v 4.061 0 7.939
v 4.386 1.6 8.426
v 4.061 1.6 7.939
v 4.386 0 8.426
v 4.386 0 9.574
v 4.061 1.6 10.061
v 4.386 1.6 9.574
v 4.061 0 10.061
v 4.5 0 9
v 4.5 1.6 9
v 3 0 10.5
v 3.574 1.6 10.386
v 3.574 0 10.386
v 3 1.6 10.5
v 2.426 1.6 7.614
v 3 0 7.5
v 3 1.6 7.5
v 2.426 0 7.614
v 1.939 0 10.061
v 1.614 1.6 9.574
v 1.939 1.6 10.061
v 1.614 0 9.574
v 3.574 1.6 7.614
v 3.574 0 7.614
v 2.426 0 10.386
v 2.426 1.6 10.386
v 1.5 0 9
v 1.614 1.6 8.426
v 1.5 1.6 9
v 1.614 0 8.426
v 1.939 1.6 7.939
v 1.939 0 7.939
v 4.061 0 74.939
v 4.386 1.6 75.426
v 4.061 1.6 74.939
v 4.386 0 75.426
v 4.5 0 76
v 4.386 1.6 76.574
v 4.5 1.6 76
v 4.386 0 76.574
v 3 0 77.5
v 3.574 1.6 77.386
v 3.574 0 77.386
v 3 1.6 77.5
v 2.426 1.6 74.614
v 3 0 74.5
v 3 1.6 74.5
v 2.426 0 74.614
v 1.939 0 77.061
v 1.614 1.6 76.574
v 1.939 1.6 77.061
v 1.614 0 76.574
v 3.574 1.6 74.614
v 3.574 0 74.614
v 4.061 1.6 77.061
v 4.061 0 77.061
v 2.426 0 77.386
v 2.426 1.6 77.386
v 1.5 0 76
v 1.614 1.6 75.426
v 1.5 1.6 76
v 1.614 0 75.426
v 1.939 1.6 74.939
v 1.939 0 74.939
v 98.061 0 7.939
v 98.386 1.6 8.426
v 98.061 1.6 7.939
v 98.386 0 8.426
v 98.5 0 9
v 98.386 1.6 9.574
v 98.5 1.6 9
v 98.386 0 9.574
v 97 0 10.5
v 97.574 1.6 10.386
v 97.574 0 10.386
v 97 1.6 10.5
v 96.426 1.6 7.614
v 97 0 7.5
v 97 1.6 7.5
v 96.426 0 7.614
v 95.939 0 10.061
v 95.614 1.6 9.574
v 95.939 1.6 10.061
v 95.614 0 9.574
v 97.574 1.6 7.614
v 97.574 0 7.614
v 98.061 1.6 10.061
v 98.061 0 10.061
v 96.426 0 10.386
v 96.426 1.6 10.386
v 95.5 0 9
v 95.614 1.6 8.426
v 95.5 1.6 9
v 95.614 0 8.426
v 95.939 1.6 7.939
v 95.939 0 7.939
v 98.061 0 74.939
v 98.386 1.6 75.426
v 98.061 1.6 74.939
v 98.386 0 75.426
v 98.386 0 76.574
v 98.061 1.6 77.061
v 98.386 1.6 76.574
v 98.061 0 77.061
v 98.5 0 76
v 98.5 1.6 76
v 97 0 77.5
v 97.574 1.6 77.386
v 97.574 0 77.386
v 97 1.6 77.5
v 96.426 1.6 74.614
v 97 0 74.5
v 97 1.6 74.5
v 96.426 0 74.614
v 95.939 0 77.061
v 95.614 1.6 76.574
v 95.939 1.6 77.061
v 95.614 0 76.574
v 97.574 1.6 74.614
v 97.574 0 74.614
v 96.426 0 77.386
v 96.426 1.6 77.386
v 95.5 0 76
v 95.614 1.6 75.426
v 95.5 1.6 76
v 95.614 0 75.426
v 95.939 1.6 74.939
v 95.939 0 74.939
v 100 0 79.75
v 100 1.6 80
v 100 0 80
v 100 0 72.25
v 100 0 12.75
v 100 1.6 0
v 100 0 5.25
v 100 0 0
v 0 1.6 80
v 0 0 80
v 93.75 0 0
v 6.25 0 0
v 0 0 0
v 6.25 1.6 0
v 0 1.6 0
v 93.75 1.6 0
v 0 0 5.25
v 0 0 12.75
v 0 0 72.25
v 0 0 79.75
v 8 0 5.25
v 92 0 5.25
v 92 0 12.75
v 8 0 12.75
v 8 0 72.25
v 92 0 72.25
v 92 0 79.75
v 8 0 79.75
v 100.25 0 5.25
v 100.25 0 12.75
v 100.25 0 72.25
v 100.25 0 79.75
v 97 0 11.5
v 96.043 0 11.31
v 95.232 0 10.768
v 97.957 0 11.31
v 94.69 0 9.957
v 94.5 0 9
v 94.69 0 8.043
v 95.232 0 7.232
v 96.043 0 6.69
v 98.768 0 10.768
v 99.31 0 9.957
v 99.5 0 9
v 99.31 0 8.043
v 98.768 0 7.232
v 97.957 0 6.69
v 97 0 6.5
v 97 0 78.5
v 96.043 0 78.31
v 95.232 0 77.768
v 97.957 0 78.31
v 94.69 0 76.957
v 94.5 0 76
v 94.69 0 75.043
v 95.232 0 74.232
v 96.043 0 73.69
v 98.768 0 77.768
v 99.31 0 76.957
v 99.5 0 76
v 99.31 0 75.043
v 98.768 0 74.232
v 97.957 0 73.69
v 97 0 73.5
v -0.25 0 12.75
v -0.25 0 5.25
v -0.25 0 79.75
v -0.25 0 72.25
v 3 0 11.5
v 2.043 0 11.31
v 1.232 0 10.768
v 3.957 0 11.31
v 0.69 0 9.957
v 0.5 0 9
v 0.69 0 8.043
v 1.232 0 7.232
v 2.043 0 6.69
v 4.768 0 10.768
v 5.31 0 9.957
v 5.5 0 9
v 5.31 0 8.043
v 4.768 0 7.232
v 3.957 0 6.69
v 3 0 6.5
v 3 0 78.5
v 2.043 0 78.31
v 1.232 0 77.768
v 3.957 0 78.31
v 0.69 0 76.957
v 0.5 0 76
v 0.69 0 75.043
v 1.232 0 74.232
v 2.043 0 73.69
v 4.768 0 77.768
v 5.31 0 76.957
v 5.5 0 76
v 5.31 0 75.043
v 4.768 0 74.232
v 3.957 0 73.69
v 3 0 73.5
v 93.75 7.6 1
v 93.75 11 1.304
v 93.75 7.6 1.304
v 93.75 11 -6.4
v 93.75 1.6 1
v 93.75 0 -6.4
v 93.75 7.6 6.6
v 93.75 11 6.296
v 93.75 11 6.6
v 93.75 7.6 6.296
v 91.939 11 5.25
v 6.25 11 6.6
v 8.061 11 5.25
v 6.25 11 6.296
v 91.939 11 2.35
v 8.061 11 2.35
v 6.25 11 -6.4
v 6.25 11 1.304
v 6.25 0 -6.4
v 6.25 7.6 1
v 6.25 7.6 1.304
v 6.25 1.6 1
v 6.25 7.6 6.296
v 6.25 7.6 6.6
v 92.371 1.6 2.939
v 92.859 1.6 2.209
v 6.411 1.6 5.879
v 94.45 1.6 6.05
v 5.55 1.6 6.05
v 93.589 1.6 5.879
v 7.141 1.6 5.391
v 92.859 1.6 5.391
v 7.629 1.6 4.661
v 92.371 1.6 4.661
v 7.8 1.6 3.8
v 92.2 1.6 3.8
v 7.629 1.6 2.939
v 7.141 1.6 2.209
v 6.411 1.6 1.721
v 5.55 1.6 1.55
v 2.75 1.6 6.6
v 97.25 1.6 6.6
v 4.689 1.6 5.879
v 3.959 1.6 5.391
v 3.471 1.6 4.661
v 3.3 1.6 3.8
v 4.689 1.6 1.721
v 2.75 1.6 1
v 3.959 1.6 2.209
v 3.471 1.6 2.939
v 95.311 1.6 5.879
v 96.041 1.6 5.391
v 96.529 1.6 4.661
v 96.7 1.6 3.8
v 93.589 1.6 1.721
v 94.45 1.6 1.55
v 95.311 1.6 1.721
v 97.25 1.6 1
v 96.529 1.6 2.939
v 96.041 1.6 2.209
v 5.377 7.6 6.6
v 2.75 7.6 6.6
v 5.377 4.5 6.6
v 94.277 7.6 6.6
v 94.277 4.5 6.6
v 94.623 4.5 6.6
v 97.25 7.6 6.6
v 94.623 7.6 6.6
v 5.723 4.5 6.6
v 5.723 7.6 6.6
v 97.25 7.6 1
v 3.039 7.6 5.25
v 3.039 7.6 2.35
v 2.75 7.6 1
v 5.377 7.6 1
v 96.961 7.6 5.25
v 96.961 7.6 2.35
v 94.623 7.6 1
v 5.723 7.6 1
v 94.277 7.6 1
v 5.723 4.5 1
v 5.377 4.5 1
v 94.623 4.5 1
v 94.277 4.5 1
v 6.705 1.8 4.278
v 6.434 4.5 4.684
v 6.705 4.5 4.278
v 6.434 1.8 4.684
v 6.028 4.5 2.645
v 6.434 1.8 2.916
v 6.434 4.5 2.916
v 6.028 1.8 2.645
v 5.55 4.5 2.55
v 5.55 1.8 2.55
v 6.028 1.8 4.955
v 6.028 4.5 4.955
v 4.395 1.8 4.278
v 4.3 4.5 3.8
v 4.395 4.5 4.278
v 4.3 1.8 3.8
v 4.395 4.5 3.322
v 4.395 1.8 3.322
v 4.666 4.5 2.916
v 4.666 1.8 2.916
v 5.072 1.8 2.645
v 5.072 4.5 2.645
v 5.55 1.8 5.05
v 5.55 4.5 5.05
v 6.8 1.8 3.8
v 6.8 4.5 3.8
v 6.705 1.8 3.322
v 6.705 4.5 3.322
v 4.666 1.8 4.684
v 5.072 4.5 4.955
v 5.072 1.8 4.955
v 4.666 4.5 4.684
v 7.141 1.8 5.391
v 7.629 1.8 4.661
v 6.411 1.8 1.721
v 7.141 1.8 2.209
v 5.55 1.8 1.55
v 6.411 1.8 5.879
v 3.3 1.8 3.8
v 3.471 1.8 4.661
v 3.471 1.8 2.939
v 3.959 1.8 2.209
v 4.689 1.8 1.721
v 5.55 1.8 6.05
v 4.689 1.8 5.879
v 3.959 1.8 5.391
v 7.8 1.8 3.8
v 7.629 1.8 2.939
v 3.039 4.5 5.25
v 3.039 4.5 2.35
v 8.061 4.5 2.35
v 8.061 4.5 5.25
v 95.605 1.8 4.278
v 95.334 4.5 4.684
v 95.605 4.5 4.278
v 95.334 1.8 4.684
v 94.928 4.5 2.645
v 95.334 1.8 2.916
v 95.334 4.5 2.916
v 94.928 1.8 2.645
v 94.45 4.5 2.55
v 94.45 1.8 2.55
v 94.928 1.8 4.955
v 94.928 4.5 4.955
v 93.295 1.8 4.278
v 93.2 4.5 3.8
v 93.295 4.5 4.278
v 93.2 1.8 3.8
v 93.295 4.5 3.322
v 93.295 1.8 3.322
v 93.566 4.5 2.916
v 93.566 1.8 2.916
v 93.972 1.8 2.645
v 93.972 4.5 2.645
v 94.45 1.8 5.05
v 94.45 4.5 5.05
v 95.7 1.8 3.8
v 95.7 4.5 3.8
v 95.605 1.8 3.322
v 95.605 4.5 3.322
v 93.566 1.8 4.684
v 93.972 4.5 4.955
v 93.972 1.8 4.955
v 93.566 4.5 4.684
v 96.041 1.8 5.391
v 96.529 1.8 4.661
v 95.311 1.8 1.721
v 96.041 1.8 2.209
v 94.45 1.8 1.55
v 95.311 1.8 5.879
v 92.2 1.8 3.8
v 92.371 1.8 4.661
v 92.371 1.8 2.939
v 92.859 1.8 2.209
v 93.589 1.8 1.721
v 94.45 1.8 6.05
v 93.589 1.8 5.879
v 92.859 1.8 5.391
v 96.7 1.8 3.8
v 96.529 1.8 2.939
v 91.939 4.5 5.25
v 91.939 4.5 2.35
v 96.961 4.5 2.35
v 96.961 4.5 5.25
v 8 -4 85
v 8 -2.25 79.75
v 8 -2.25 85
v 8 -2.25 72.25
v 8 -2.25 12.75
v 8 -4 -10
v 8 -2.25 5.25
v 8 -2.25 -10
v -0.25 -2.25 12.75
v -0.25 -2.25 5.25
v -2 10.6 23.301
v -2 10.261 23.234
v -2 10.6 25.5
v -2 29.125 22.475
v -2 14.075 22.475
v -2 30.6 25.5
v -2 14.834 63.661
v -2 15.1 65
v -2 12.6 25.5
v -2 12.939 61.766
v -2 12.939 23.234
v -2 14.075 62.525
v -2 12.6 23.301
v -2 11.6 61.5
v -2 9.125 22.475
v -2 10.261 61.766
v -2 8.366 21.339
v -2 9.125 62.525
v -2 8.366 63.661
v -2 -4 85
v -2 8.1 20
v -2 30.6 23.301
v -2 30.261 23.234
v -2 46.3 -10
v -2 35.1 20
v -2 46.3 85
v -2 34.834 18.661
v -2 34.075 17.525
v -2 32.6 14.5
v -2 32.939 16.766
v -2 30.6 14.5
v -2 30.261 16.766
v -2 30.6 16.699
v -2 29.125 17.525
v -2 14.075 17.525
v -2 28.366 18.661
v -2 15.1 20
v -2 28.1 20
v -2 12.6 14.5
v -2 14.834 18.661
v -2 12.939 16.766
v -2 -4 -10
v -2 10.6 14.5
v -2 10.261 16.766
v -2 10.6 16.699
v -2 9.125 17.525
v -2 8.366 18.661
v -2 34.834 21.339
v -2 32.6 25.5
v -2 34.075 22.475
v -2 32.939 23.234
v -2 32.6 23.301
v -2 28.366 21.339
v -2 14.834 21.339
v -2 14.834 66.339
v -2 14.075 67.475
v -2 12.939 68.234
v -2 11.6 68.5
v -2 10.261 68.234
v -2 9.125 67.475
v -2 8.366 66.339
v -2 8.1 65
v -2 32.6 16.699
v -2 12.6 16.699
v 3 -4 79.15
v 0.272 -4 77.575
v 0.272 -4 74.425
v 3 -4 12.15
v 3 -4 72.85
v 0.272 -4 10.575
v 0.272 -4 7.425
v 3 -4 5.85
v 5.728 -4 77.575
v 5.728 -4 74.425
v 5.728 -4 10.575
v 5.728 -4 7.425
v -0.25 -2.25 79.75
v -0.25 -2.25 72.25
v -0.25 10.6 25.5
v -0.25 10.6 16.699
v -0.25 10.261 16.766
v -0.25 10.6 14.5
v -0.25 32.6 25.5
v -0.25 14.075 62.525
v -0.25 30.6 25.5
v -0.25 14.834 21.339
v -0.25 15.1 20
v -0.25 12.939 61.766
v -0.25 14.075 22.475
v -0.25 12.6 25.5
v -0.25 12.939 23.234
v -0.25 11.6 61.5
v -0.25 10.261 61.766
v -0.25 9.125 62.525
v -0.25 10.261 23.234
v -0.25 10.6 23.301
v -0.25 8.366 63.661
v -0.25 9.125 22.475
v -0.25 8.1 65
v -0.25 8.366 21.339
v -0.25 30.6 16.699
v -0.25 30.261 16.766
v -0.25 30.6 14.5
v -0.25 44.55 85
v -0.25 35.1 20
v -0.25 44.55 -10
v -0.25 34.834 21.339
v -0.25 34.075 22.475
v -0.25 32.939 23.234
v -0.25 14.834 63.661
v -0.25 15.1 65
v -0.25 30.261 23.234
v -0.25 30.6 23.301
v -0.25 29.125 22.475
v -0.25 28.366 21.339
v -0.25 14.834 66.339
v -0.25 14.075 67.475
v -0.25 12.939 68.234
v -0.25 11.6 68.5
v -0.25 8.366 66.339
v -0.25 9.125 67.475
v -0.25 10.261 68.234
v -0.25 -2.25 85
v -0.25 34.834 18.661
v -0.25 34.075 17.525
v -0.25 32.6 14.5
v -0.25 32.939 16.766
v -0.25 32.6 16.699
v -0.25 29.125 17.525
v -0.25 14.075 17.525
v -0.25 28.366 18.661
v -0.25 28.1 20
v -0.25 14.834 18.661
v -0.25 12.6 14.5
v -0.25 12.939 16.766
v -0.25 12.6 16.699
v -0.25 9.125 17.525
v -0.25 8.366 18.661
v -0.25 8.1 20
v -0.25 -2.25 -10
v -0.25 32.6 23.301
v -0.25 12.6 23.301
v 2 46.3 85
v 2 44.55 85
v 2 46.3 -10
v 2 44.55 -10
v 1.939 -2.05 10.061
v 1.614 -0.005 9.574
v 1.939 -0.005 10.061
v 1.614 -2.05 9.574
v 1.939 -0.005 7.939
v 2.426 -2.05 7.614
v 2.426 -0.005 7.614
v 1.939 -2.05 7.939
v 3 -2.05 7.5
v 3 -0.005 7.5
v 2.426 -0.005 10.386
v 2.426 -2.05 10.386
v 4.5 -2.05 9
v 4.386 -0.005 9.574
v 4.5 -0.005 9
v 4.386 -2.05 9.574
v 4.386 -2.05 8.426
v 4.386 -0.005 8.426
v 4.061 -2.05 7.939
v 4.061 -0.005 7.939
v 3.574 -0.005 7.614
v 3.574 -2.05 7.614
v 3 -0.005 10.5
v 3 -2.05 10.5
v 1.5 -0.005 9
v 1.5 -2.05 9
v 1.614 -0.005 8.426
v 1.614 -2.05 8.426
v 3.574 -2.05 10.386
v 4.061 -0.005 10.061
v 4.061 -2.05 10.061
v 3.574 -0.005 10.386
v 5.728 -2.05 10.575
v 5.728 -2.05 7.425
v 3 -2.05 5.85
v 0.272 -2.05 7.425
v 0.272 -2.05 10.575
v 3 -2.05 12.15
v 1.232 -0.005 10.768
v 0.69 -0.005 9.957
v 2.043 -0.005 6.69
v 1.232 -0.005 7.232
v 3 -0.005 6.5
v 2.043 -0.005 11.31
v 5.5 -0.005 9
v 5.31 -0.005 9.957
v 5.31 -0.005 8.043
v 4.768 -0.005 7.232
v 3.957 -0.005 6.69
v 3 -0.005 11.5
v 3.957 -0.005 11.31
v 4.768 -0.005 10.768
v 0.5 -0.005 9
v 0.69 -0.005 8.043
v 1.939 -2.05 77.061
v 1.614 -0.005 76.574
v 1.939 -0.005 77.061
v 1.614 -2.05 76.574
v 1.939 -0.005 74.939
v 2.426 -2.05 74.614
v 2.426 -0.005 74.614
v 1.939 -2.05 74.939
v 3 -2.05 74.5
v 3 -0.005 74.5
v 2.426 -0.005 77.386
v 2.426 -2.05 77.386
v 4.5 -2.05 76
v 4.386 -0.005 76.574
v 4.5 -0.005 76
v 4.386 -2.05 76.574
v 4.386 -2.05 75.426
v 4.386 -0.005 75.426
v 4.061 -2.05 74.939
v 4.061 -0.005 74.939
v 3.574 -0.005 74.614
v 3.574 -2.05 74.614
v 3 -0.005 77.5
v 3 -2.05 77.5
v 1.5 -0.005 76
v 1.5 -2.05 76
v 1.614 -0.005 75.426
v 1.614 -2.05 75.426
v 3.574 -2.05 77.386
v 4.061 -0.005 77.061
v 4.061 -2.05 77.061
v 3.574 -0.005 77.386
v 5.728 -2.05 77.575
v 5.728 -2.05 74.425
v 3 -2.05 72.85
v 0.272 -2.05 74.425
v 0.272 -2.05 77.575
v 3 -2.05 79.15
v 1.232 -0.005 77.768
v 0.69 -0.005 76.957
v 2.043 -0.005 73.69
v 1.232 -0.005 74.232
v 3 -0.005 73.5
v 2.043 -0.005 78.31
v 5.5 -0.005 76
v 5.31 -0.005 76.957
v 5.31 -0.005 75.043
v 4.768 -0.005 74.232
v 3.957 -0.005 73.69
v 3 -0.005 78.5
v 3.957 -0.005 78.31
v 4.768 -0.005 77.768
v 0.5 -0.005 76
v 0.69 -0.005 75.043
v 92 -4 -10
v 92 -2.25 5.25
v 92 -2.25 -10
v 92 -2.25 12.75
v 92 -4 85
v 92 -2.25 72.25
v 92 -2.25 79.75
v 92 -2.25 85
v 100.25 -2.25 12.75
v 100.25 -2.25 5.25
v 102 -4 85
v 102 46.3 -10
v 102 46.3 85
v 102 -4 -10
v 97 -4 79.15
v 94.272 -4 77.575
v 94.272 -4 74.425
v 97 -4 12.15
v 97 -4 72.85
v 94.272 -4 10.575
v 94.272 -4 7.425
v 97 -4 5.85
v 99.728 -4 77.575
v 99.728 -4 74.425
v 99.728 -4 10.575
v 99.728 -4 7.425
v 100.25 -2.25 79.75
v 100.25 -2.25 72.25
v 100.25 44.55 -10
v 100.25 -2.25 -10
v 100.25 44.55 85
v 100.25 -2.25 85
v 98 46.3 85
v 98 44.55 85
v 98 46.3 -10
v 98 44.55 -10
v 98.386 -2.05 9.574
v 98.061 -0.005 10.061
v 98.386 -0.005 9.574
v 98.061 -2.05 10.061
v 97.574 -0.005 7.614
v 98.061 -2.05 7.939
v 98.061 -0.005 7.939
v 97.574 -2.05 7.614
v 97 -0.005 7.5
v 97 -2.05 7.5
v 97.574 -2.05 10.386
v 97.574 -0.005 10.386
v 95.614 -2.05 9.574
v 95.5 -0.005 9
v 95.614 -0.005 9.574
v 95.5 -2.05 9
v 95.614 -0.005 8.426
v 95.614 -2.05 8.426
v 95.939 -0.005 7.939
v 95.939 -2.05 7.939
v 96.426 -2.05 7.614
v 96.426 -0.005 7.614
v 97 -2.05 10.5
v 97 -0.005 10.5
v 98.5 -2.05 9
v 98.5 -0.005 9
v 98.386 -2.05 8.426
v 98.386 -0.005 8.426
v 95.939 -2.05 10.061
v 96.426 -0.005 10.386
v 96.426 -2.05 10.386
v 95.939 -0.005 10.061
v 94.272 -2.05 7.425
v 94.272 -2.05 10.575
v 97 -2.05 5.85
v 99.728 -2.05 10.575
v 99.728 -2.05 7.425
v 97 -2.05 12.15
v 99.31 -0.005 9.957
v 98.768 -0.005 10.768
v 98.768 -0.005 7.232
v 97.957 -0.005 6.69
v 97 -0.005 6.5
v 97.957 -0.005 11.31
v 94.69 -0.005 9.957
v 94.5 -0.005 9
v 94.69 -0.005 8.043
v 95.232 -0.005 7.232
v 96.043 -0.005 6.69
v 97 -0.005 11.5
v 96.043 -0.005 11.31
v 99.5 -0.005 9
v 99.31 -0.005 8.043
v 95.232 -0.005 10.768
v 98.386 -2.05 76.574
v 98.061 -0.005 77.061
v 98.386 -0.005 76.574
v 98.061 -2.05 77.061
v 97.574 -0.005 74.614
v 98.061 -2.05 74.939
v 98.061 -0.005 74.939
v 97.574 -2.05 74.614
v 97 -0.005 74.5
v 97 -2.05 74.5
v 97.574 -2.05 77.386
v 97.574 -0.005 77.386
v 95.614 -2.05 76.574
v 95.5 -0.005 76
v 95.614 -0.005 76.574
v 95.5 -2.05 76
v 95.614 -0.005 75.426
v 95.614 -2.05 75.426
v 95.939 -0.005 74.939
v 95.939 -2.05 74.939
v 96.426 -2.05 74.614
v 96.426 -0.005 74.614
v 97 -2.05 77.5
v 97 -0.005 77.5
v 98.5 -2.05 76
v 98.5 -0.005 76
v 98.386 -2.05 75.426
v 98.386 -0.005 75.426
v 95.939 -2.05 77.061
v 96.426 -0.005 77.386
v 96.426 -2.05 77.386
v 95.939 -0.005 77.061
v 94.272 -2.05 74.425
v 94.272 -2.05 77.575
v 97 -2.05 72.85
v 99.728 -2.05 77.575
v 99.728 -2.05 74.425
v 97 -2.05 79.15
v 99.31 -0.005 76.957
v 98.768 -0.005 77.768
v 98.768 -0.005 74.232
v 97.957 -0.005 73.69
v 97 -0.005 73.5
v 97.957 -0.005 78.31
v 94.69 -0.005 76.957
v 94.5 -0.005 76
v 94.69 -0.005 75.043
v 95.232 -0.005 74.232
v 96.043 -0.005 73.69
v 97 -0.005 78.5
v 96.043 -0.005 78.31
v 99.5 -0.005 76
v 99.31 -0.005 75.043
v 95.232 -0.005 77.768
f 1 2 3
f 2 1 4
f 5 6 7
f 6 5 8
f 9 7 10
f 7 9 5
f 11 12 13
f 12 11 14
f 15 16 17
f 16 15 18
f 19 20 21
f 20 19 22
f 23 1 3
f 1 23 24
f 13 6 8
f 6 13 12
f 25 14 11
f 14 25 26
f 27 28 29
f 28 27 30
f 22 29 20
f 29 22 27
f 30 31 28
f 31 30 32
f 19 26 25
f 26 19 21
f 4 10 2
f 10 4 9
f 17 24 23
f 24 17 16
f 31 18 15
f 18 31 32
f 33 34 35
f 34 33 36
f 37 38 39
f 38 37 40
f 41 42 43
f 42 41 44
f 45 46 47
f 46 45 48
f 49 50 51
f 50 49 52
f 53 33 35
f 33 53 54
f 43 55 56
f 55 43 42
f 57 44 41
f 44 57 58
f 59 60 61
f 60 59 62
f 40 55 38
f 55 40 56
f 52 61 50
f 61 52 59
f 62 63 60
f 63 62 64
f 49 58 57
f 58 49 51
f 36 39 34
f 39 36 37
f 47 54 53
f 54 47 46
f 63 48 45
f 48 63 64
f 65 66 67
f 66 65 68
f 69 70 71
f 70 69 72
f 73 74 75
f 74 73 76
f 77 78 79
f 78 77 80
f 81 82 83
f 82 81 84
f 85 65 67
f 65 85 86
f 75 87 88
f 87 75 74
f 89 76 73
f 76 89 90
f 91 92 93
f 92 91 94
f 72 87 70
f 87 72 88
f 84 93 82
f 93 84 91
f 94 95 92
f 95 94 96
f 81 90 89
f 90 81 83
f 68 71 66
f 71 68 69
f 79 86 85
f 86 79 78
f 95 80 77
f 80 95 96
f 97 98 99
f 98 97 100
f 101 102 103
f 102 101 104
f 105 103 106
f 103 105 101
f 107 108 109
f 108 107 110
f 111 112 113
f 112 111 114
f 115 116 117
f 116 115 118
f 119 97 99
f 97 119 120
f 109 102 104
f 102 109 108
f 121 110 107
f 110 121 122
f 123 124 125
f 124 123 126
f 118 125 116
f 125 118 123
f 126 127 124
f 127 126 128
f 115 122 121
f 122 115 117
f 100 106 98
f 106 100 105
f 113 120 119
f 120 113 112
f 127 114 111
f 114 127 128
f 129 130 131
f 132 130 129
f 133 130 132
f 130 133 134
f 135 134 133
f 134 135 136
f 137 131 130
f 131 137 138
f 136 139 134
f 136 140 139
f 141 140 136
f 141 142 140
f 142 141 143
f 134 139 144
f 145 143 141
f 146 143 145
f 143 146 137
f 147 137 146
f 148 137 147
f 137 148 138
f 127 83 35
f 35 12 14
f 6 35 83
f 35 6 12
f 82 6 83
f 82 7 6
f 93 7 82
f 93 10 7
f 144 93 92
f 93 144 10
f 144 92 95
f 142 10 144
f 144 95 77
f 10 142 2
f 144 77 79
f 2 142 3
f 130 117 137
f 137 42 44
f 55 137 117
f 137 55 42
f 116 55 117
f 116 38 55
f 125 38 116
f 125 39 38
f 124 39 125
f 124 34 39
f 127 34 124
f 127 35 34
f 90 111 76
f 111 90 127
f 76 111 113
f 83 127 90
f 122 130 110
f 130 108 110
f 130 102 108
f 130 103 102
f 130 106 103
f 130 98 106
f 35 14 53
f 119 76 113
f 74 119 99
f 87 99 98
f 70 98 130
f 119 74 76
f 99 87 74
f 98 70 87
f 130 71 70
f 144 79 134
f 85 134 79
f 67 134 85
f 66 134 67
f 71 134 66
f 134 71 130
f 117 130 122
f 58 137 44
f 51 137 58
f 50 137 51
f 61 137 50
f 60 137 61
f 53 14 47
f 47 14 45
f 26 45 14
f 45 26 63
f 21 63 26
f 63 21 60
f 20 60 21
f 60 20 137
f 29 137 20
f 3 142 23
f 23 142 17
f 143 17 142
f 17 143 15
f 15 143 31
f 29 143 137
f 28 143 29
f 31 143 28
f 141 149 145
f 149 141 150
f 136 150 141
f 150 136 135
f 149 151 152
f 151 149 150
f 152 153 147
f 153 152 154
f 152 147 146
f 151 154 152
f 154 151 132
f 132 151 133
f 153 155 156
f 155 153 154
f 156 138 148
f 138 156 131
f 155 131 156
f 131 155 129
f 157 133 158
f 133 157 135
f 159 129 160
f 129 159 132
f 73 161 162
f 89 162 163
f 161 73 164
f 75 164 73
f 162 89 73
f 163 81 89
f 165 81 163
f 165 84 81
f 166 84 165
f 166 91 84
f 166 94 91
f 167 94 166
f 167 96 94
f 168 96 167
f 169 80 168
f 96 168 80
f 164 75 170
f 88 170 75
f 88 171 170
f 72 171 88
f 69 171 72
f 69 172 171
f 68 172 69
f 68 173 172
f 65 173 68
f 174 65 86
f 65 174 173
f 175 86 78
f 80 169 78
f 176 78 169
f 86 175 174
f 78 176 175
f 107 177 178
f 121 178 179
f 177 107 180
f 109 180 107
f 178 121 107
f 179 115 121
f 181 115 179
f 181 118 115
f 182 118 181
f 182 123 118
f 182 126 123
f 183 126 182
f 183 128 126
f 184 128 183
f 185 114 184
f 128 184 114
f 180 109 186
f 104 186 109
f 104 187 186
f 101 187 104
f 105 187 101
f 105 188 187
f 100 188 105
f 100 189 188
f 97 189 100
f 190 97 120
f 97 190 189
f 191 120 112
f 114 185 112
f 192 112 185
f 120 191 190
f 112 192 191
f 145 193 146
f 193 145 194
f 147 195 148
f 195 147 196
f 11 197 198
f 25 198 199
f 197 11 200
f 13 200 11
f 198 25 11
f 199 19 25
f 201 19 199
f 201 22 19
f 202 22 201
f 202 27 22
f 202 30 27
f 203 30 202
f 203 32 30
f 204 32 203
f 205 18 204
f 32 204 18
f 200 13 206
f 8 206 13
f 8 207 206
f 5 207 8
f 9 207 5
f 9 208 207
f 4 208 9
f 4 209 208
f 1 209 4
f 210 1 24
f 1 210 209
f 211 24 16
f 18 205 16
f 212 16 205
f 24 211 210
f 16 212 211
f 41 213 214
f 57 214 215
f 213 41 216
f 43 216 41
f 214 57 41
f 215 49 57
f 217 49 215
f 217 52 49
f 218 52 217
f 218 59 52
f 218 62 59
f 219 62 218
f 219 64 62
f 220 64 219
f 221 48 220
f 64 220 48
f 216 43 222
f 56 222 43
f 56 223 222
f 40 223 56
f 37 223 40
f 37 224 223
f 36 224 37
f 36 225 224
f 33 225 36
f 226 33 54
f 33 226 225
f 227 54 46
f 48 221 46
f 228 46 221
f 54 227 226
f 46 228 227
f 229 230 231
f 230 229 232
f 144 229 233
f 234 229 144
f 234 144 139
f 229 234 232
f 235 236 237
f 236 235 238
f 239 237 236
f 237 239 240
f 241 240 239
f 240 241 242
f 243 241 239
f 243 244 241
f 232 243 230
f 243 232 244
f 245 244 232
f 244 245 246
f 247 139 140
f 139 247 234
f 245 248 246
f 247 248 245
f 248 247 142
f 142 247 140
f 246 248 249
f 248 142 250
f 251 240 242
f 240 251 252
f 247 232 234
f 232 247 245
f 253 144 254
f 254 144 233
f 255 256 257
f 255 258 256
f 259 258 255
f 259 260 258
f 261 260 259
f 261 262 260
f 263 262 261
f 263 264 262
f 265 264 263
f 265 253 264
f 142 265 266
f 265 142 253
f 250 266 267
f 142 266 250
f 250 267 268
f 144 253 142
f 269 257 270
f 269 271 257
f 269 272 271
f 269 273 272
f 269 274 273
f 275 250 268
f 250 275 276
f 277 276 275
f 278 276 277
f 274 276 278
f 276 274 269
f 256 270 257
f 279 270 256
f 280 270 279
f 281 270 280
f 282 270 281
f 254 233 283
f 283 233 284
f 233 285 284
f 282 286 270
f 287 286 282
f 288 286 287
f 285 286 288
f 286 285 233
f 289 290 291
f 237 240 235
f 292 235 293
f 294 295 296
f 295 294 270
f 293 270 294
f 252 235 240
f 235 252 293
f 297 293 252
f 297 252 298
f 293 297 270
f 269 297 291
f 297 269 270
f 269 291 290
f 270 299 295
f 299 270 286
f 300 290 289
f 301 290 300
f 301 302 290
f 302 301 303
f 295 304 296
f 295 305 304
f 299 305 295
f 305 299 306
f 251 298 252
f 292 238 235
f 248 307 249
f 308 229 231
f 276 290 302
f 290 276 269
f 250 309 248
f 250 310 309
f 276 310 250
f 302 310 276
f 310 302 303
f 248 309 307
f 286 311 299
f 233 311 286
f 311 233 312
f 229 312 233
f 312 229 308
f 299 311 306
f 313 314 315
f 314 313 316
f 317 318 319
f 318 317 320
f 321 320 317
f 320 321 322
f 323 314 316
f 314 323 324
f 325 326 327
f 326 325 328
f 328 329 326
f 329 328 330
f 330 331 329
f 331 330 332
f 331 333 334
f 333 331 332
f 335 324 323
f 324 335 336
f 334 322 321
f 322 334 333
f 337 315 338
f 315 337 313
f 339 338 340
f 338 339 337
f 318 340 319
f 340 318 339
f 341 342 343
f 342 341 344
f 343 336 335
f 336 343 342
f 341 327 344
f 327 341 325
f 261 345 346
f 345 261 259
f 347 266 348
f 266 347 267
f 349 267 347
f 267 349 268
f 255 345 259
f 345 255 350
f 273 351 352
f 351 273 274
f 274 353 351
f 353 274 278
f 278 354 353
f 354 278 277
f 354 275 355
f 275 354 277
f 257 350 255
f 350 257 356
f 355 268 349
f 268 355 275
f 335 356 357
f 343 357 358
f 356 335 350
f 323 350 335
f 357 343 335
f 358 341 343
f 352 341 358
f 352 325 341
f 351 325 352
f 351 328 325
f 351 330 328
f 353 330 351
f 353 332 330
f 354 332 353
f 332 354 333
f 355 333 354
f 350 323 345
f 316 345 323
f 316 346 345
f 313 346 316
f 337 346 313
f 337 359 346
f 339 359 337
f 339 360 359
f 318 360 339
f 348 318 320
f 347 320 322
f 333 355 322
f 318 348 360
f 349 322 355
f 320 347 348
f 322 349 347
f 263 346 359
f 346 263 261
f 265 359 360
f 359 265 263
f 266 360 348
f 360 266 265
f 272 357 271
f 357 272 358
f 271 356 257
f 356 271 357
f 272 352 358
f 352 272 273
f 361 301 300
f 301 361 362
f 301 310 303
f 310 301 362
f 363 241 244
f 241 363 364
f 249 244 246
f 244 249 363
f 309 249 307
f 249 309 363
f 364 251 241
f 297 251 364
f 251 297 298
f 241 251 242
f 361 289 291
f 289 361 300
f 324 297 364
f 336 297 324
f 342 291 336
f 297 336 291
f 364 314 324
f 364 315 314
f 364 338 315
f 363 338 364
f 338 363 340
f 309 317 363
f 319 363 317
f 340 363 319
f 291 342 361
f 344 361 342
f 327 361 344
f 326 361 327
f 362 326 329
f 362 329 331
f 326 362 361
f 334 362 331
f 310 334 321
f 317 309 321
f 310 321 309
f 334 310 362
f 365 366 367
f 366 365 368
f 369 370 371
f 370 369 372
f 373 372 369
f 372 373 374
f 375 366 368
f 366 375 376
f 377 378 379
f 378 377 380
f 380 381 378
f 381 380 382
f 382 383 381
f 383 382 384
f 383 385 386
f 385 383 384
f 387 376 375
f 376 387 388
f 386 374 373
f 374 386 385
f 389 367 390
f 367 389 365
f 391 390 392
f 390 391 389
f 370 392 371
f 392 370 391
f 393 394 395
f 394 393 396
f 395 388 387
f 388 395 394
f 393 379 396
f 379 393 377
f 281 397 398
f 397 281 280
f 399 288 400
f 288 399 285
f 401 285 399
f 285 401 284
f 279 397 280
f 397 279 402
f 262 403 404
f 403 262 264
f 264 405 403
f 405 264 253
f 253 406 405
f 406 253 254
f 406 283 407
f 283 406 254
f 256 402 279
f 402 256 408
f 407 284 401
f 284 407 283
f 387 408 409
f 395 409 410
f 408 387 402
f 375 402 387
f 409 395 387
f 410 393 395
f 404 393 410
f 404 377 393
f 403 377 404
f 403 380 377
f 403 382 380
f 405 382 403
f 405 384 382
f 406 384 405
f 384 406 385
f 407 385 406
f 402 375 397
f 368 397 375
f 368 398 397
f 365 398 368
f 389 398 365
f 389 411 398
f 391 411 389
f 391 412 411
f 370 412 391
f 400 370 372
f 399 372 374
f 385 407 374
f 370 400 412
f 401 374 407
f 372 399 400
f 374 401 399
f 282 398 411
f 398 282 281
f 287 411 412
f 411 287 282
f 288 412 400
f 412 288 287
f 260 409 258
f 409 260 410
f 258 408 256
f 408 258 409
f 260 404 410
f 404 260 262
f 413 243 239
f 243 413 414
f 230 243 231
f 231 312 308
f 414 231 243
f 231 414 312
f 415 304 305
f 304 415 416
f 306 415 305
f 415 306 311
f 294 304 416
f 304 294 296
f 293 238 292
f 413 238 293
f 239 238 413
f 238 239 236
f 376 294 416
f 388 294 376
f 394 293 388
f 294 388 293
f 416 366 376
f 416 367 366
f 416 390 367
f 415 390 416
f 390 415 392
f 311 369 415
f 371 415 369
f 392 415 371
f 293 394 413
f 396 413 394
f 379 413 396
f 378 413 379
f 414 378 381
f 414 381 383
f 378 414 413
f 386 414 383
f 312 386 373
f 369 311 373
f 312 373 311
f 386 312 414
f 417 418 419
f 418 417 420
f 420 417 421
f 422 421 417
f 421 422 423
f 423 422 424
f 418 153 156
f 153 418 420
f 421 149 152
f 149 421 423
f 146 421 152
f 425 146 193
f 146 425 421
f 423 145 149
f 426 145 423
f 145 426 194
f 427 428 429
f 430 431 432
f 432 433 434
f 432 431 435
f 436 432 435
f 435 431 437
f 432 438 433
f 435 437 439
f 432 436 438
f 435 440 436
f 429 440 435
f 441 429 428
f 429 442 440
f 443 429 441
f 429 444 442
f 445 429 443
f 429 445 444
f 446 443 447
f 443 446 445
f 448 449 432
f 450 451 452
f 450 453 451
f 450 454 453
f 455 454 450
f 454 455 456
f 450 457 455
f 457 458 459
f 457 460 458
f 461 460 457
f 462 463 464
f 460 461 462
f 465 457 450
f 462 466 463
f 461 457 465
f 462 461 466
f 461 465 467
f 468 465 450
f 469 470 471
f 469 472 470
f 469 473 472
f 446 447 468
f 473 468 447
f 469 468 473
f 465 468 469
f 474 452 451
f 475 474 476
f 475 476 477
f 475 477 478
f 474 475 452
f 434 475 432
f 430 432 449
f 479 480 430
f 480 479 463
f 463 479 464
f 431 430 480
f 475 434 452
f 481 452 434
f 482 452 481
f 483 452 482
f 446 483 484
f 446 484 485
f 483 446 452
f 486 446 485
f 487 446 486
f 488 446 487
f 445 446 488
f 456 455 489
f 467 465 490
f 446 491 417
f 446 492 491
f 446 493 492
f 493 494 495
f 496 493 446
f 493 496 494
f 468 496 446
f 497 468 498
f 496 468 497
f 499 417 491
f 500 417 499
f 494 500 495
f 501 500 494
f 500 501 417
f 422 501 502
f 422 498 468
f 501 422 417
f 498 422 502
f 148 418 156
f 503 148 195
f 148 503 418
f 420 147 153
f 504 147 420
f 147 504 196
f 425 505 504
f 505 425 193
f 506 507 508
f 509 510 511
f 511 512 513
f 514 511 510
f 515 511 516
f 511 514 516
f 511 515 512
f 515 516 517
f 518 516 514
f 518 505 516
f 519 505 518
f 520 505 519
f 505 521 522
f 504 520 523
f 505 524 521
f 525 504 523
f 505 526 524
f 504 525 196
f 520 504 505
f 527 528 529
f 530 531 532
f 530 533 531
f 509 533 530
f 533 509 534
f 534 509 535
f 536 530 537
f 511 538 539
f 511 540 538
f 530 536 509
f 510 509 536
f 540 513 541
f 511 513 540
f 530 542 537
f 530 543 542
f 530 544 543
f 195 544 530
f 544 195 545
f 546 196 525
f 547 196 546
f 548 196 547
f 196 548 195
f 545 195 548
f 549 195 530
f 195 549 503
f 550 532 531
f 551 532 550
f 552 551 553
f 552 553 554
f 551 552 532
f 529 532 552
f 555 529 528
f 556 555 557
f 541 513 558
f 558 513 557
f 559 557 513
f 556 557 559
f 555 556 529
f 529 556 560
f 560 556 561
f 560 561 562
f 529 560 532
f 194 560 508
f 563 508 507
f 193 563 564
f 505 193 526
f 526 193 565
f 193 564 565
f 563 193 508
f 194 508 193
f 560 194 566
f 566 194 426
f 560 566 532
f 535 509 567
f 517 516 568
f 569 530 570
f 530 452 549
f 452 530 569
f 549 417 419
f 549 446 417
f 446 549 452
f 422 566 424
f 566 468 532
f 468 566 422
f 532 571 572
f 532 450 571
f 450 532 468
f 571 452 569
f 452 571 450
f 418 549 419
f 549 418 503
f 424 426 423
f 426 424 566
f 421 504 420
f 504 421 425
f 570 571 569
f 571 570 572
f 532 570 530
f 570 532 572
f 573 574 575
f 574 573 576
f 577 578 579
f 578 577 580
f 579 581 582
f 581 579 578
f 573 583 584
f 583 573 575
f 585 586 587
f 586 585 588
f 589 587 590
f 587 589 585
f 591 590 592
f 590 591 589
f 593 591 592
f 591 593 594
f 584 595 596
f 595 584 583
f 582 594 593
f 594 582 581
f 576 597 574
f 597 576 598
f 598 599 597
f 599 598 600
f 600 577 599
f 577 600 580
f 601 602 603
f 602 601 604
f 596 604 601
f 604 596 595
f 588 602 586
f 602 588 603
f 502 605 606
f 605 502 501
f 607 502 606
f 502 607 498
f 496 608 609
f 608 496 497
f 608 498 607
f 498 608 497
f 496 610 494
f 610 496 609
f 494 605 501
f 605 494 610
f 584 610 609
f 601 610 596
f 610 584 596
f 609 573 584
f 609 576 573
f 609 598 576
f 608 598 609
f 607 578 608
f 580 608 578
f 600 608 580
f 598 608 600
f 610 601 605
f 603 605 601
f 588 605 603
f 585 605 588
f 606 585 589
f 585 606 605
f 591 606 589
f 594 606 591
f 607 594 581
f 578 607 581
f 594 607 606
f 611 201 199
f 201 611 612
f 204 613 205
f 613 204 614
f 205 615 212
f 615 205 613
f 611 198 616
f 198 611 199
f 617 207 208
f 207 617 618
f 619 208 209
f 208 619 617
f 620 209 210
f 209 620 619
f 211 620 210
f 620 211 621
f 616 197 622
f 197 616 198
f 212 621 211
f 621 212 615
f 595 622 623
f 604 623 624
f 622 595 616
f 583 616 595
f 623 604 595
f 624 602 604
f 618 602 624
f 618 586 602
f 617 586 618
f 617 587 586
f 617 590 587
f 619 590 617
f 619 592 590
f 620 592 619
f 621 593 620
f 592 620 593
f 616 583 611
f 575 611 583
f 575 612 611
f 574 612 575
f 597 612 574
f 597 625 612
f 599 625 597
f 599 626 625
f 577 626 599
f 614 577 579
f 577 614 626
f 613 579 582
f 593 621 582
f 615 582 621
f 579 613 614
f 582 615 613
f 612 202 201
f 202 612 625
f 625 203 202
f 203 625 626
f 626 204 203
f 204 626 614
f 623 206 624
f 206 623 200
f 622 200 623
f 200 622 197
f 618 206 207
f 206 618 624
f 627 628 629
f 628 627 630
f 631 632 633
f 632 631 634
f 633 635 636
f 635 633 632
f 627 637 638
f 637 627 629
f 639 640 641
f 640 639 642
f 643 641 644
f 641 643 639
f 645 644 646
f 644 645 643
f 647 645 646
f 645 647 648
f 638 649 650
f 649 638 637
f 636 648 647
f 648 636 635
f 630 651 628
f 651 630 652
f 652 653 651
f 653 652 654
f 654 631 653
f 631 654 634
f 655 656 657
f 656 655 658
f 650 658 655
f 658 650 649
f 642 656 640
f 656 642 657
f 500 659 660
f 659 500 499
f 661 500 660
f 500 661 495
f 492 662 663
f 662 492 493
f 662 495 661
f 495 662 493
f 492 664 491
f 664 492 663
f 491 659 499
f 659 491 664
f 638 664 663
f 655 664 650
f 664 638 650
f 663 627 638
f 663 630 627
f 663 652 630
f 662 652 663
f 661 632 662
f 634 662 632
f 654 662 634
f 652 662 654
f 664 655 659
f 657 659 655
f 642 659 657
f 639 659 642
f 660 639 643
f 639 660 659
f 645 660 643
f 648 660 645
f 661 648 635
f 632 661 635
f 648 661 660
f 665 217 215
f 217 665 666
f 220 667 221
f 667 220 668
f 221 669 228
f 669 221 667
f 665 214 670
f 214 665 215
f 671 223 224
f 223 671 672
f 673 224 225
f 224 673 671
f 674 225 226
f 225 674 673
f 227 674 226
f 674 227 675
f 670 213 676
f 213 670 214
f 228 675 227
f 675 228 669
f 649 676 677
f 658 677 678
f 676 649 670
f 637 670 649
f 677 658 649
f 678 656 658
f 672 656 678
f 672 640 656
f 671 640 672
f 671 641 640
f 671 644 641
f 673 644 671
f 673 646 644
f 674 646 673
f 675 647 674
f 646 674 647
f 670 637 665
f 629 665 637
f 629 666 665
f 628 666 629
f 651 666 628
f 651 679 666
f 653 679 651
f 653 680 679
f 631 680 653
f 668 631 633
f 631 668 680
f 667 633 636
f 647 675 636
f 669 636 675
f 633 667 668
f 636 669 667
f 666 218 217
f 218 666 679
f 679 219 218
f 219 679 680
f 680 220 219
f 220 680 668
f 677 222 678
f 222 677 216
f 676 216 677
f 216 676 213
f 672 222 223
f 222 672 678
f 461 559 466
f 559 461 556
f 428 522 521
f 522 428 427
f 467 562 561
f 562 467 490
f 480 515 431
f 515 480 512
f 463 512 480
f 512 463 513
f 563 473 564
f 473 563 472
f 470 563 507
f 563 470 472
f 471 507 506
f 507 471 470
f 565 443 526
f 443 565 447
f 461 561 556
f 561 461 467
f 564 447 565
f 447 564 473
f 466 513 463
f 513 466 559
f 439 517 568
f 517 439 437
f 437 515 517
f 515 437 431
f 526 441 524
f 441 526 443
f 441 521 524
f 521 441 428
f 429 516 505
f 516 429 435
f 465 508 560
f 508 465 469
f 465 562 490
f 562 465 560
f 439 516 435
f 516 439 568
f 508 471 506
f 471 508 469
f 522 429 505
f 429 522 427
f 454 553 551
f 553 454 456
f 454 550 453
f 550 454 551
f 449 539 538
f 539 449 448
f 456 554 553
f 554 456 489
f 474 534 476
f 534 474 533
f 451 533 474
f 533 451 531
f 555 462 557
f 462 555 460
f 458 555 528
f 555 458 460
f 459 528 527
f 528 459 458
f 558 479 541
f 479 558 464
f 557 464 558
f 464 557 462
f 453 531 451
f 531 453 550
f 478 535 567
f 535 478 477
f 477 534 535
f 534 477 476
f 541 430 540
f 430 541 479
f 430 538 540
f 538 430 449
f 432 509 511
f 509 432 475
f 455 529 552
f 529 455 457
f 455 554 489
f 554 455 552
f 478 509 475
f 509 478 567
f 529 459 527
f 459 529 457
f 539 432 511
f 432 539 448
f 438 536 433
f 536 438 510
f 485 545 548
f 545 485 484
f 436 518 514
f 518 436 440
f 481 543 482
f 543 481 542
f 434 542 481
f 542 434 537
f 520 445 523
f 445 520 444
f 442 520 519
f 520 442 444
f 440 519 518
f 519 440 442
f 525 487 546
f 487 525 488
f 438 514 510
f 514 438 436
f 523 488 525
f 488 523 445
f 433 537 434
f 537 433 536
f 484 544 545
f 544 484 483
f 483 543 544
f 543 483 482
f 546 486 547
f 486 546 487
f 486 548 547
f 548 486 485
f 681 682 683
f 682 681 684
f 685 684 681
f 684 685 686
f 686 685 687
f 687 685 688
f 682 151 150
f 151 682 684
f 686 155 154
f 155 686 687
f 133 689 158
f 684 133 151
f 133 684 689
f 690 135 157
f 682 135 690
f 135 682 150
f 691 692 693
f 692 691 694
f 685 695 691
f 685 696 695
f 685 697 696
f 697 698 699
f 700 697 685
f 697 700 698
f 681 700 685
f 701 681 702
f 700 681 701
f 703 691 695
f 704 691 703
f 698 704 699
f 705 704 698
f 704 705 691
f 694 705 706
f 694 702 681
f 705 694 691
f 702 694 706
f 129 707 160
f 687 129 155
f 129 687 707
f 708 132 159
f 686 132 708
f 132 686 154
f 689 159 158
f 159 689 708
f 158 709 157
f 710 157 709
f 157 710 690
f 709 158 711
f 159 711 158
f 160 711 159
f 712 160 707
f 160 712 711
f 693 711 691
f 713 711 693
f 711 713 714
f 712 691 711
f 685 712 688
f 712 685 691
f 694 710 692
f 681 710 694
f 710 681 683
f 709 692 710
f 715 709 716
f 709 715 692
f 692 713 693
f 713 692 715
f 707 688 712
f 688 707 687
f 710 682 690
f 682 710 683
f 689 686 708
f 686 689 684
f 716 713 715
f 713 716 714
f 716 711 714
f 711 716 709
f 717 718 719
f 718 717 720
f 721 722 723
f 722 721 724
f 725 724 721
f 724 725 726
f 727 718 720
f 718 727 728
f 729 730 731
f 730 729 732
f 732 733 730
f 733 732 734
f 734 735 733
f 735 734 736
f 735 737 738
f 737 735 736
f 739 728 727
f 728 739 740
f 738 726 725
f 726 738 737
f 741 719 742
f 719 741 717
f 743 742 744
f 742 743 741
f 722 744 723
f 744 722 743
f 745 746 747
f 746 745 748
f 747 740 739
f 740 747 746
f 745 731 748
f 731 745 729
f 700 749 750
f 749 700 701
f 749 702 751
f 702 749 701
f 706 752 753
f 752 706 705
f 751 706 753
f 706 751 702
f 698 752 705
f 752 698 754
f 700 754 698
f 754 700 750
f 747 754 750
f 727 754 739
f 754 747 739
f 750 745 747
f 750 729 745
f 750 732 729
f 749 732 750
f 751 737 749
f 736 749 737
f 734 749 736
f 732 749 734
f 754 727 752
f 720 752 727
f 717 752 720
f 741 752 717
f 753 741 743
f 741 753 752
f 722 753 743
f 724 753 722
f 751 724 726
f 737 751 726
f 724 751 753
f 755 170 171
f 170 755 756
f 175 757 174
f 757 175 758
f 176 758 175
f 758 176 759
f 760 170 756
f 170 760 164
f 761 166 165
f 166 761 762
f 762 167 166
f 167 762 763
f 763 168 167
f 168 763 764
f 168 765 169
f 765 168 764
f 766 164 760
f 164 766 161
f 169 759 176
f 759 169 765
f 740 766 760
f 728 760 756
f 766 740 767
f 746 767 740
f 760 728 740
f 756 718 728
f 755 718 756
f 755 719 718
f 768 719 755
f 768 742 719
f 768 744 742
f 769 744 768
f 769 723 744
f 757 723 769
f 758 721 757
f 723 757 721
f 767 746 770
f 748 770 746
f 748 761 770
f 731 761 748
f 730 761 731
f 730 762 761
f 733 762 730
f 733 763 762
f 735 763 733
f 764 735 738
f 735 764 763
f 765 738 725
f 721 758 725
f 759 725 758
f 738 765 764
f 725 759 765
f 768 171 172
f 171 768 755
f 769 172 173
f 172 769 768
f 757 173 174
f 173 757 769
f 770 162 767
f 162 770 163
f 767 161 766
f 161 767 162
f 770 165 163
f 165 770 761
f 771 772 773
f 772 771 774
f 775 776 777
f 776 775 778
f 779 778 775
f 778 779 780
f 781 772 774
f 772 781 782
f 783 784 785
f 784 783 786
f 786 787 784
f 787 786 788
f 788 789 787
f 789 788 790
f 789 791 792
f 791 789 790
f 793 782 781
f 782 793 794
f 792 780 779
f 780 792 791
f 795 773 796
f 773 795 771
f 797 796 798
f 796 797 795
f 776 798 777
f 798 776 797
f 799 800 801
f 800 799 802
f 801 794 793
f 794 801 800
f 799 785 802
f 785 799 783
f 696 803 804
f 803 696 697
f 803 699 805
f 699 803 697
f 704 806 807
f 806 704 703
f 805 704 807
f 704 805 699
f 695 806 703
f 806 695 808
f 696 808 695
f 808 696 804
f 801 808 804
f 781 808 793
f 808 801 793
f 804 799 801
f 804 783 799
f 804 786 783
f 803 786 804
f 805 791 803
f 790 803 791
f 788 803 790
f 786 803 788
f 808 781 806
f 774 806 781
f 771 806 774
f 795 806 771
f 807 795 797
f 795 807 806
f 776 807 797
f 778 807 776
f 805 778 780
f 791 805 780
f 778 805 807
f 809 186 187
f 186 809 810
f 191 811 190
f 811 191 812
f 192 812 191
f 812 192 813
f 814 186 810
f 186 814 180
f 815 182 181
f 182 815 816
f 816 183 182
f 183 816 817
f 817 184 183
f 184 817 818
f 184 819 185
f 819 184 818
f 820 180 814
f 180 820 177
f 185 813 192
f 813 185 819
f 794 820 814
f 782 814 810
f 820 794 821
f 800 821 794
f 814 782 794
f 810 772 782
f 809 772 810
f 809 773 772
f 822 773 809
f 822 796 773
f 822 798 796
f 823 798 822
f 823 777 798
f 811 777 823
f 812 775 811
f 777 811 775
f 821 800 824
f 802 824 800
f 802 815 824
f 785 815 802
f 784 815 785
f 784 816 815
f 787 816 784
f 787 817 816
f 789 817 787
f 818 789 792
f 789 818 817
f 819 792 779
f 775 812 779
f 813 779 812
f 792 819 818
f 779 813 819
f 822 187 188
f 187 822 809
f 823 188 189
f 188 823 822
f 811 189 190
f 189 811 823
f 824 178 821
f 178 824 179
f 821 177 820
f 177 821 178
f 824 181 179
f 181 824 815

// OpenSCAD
// file: ../library/din41612/din41612_male.scad
// din41612 male connector
// =======================

include <din41612_male_dim.scad>

use <../linurs/linurs_screw.scad>

module din41612_male(){ 
  // color("LightGrey")
  difference(){
    union(){
        translate([0,din41612_male_w1/2,din41612_male_h/2-din41612_male_h1])  
        cube([din41612_male_l1,
              din41612_male_w1,
              din41612_male_h],
             center=true);  
      translate([0,(din41612_male_w1-din41612_male_w)/2,(din41612_male_h-din41612_male_h1)/2]) 
        cube([din41612_male_l1,
              (din41612_male_w-din41612_male_w1),
              din41612_male_h-din41612_male_h1],
             center=true);  
      translate([0,din41612_male_w2/2+din41612_male_w1-din41612_male_w,din41612_male_h2/2])
        cube([din41612_male_l,
              din41612_male_w2,
              din41612_male_h2],
             center=true);  
    }
    for(i=[-1,1]){ // mounting holes
      translate([i*din41612_male_dl/2,
                 din41612_male_w1-din41612_male_w+din41612_male_w2/2, 
                 din41612_male_h1])
      rotate([180,0,90])screw_fix(
            w=din41612_male_h2, 
            d=M2_5, 
            type=head_cyl, 
            nut_sink=din41612_male_h,
            t=0);
    }
  }
}
din41612_male();  
// file: ../library/din41612/din41612_male_dim.scad
include <../linurs/linurs_screw_dim.scad>

// connector dimensions
din41612_male_l=94.5;    // lenght of the connector
din41612_male_l1=87.5;   // 
din41612_male_w=13;      // width of the connector
din41612_male_w1=6.4;    // 
din41612_male_w2=5.6;    // 
din41612_male_h=11;      // height of the connector
din41612_male_h1=1.6;    // 
din41612_male_h2=6;      // 

din41612_male_dl=88.9;   // distance between mounting holes
// file: ../library/din41612/din41612_female_dim.scad
include <../linurs/linurs_screw_dim.scad>

// connector dimensions
din41612_female_l=95;       // lenght of the connector
din41612_female_l1=85;      // lenght of the connector head
din41612_female_h=11.6;     // height of the connector
din41612_female_h1=5.2;     // height produced by the connector when pulgged in 
din41612_female_w=11;       // width of the connector
din41612_female_w1=8.5;     // width of the connector head

din41612_female_dl=90;      // distance between mounting holes
// file: ../pcb/pcb.scad
// pcb
// ===
// The pcb is the master object and has its 
// lower left corner solder side at the origin of the 
// coordinate system 

n=2;  // [1,2,3,4,5,6,7,8]
show_pcb="assemblies"; // [assemblies,assembly,pcb]

include <pcb_dim.scad>
include <../motherboard/motherboard_dim.scad>

use <../library/din41612/din41612_male.scad>

module pcb(){
  echo("pcb");  
  color("greenyellow")
  difference(){
    cube([pcb_l,pcb_h,pcb_w]); // pcb
    for(x=[-1,1]){ // mounting holes
      for(y=[pcb_wd1,pcb_wd1+pcb_wd]){
        translate([x*pcb_ld/2+pcb_l/2,0,y])
        rotate([90,0,0])
        cylinder(d=pcb_d,h=3*pcb_h,center=true,$fn=16);
      }
    }
  }
}

module pcb_assembly(){
  echo("pcb assembly");  
  pcb();  
  translate([pcb_l/2,pcb_h,0])  
  rotate([-90,0,0])din41612_male();  
}

module pcb_assemblies(n=1){
  echo("pcb assemblies"); 
  for(i=[0:n-1]){ // add the connectors
      echo(i);
      translate([0,step*i,0])
      pcb_assembly();
  }    
}    

if(show_pcb=="assemblies"){
  pcb_assemblies(n=n);
}

if(show_pcb=="assembly"){
  pcb_assembly();
}

if(show_pcb=="pcb"){
    // Move to center to create 2D drawings from top view 
    // with script OpenSCAD22d.py
    //
    rotate([90,0,180])
    //
    translate([-pcb_l/2,-pcb_h/2,-pcb_w/2])
    pcb();
}
// file: ../bracket/bracket.scad
// bracket
// =======
// A bracket of the elecbox module
// - type: 0 front bracket, 1 rear bracket
// - width 1..n in steps

// parameters for customizer
// bracket width
n=2; // [1,2,3,4,5,6,7,8]
// type
bracket="Front"; // [Front,Back]
// intermediate mounting holes
intermediate=false;  

include <../pcb/pcb_dim.scad>

include <../motherboard/motherboard_dim.scad>
include <../library/linurs/linurs_screw_dim.scad>
include <bracket_dim.scad>

use <../library/linurs/linurs_screw.scad>
    
module back_bracket(n=1, intermediate=false){
  mirror([1,0,0])       // mirror it if desired
  front_bracket(n=n, intermediate=intermediate); 
}
    
module front_bracket(n=1, intermediate=false){
  echo("bracket");  
  //color("White")
  intermediatestep=(intermediate)?step:0; 
  difference(){
    union(){
      translate([-bracket_h2/2-bracket_gap/2,
                 bracket_w(n)/2-bracket_w1,
                 bracket_l/2])  
      cube([bracket_h2,
            bracket_w(n),
            bracket_l],center=true); // create the bracket front
  
      translate([bracket_h/2-bracket_h2-bracket_gap/2,
                 bracket_t/2-bracket_w1,
                 bracket_l/2]) 
      cube([bracket_h,
            bracket_t,
            bracket_l],center=true); // U shape side of the screw
      
      translate([bracket_h1/2-bracket_h2-bracket_gap/2,
                 bracket_w(n)-bracket_w1-bracket_t/2,
                 bracket_l/2]) 
      cube([bracket_h1,
            bracket_t,
            bracket_l],center=true); // U shape where no screw  
      for(x=[1:n]){  // create the mounting hole cubes 
        for(z=[bracket_l1,
               bracket_l1+bracket_ld]){
          translate([ bracket_h/2-bracket_h2-bracket_gap/2,
                     -bracket_w1/2+(x-1)*intermediatestep,
                     z])
          cube([bracket_h,
                bracket_w1,
                bracket_l2],center=true);
        }
      }   
    }
    for(x=[1:n]){ // create the mounting hole 
      for(z=[bracket_l1,
             bracket_l1+bracket_ld]){
        translate([bracket_h3-bracket_h2-bracket_gap/2,
                  -bracket_w1/2+(x-1)*intermediatestep,
                   z])
        rotate([0,90,0])
        rotate([-90,0,0])
        screw_fix(w=bracket_w1,d=bracket_screw,type=head_no, t=bracket_screw_gap);
      }
    }
  }
}

if(bracket=="Front"){
  front_bracket(intermediate=intermediate,n=n);
}

if(bracket=="Back"){
  back_bracket(intermediate=intermediate,n=n);
}
// file: ../library/linurs/linurs_screw.scad
// Metric screws and nuts 
// urs@linurs.org 2019
// It is targeted for 3D printing applications. 
// To look realistic is not the goal (Example: Nuts do not have a hole)

include <linurs_screw_dim.scad>

d=0; //[0:M2_5,1:M3,2:M4,3:M5]
type=0;//[0:head_cyl,1:head_cnt,2:head_no,3:head_hex]
w=15; 
i=10;
nut_sink=0;
screw_sink=0; 
t=0.01;
fn=16;

/* [hex_bolt] */
show_hex_bolt=false;

/* [nut] */
show_nut=false;

/* [screw] */
show_screw=false;

/* [screw_fix] */
show_screw_fix=false;

/* [screw_cut] */
show_screw_cut=false;

/* [nut_cut] */
show_nut_cut=false;
wi=0; 
rot=false;

// functions used multiple times to position nuts and heads
function headh_cyl(d)=screw_cyl[d][1];  // height of cyl screw head
function headh_cnt(d)=screw_cyl[d][1];  // height of cnt screw head
function headh(d,type=head_cyl)=(type==head_cyl ? headh_cyl(d) : (type==head_cnt ? headh_cnt(d) : 0 )); // height of screw head 

function nuth(d)=screw_hex[d][2];   // height of hex nut

// head of a cylinder screw
module screw_head_cyl(d=M3, t=0)
{
  screwhd=screw_cyl[d][0]+t; // diameter of cylinder screw head
  cylinder(d=screwhd,h=headh(d=d, type=head_cyl), center=true,$fn=16); // screw head
}

// head of a countersunk screw
module screw_head_cnt(d=M3, t=0)
{
  screwd=screw_d[d]+t; 
  screwhd=screw_cnt[d][0]+t; // diameter of cylinder screw head
  cylinder(d1=screwd,d2=screwhd,h=headh(d=d,type=head_cnt), center=true,$fn=16); // screw head
}

// head of a hex screw
module screw_head_hex(d=M3, t=0)
{
    translate([0,0,-nuth(d)/2])nut(d=d, t=t);
}

// head of all screws
module screw_head(d=M3, type=head_cyl, t=0)
{ 
  if(type==head_cnt){
    screw_head_cnt(d=d, t=t);
  } else {
    if(type==head_cyl){
      screw_head_cyl(d=d, t=t);
    } else {
       if(type==head_hex){
           screw_head_hex(d=d, t=t); 
       } 
    }    
  }
}

// hex bolt 
module hex_bolt(d=M3, w=10, t=0)
{
  nutd=screw_hex[d][1]+t; // outer diameter of hex bolt
  cylinder(r=nutd/2,h=w+t, center=true,$fn=6); // nut
}

// nut 
module nut(d=M3, t=0)
{
  hex_bolt(d=d, w=nuth(d), t=t);    
}

// screw 
// w outer width of the screw = screw length + head 
module screw(w=10, d=M3, type=head_cyl, t=0){
  screwd=screw_d[d]+t;       // screw diameter
  cylinder(d=screwd, h=w, center=true,$fn=16); // screw thread length
  translate([0,0,w/2-headh(d=d,type=type)/2])
  screw_head(d=d,type=type, t=t);
}

// screw fix
// w outer width of the screw = screw length + head 
// sink additional material below to remove 
// raise additional material above to remove
module screw_fix(w=10, d=M3, type=head_cyl, screw_sink=0, nut_sink=0, t=0){
  screw(w=w, d=d, type=type, t=t);
  translate([0,0,-w/2+nuth(d)/2])
    nut(d=d,t=t);
  //additional material to be removed above the nut  
  translate([0,0,-(w+nut_sink)/2])hex_bolt(d=d,w=nut_sink+0.01,t=t);    
  //additional material to be removed above the screw head
  if(type==head_cnt){  
    translate([0,0,w/2+screw_sink])
    cylinder(d=screw_cnt[d][0]+t,h=screw_sink+0.01,center=true,$fn=16);
  }else{ 
    translate([0,0,(w+screw_sink)/2])
    cylinder(d=screw_cyl[d][0]+t,h=screw_sink+0.01,center=true,$fn=16);
  }     
}

// screw cut
// material to be extracted from object to slide in a counter sunk screw for fixation
// w height of the cut out
// i depth of the screw
module screw_cut(d=M3,w=20,i=10,t=0,fn=32){
    hsh=screw_cnt[d][1];
    ws=screw_cnt[d][0]+t;
    ds=screw_d[d]+t;
    
    translate([i/2,0,-(w-hsh)/2])
      cube([i,ws,hsh],center=true);
    
    translate([0,0,-(w-hsh)/2])
      cylinder(d=ws,h=hsh,center=true,$fn=32);
    
    translate([0,0,-(w-hsh)/2+hsh])
        cylinder(d2=ds, d1=ws, h=hsh,center=true,$fn=fn);
    
    cylinder(h=w, d=ds, center=true, $fn=fn);   
    
    translate([i/2,0,0]) 
        cube([i,ds,w],center=true);
    
    for(y=[-1,1]){
        translate([i/2,y*ds/2,-w/2+hsh])
            rotate([45,0,0])
            cube([i,sqrt(2)*(ws-ds)/2,sqrt(2)*(ws-ds)/2],center=true);
    }
}
//screw_cut();

// nut cut
// material to be extracted from object to slide in a nut for fixation
// w height of the cylinder
// i lenght of the inlet
module nut_cut(w=10, wi=0, d=M3, i=10, t=0, rot=false,type=head_cyl){ 
  r=(rot)?90:0;
  ds=(rot)?screw_hex[d][1]:screw_hex[d][0];
  rotate([0,0,r])nut(d,t);
  translate([i/2,0,0])
    cube([i,ds+t,nuth(d)+t],center=true);
  translate([0,0,-wi])
      if(type==head_cnt){    
          screw(w=w, d=d, type=type, t=t); 
        translate([0,0,w/2])
          cylinder(d=screw_cnt[d][0]+t,h=raise,center=true,$fn=16);
      }
      else{ 
          screw(w=w, d=d, type=type, t=t);   
  //      translate([0,0,0])
          //#cylinder(d=screw_cyl[d][0]+t,h=w,center=true,$fn=16);
      }       
}

if(show_hex_bolt==true){
   hex_bolt(d=d, w=w, t=t);
}

if(show_nut==true){
  nut(d=d, t=t);
}    

if(show_screw==true){
   screw(w=w, d=d, type=type, t=t);
}

if(show_screw_fix==true){
  screw_fix(w=w, d=d, type=type, nut_sink=nut_sink, screw_sink=screw_sink, t=t);
}

if(show_screw_cut==true){
  screw_cut(d=d,w=w,i=i,t=t,$fn=fn);
}    

if(show_nut_cut==true){
  nut_cut(w=w, wi=wi, d=d, i=i, t=t,rot=rot,type=type);
}  
// file: ../library/linurs/linurs_screw_dim.scad
// Metric screws and nuts 
// urs@linurs.org

// contains dimensions of linurs_screw and can be included in other 
// OpenScad files 

// Parameters in this file
// d screw diameter M2_5, M3, ... (enumeration with screw_d)
// t millimeters added to diameters 

// enumerations of metric threads
M2_5=0;
M3=1;
M4=2;
M5=3;

// enumerations screw head type
head_cyl=0; // cylinder
head_cnt=1; // countrsunk
head_no=2;  // no head at all
head_hex=3;  // no head at all

// screw diameters
screw_d=[
2.5, // M2.5
3.0, // M3
4.0, // M4
5.0  // M5
];

// sizes for hex nuts
screw_hex=[
//   s,   e,   h
 [ 5.0, 5.8, 1.7], // M2.5
 [ 5.5, 6.4, 2.0], // M3
 [ 7.0, 8.1, 2.8], // M4
 [ 8.0, 9.2, 3.5]  // M5
];

// sizes for cylinder screw heads
screw_cyl=[
//   d,   h
 [ 4.5, 1.6], // M2.5
 [ 5.5, 2.0], // M3
 [ 7.0, 2.6], // M4
 [ 8.5, 3.3]  // M5
];

// sizes for countersunk screw heads
screw_cnt=[
//   d,   h
 [ 4.7, 1.50], // M2.5
 [ 5.6, 1.65], // M3
 [ 7.4, 2.20], // M4
 [ 9.2, 2.50]  // M5
];
// file: ../motherboard/motherboard_dim.scad
include <../library/linurs/linurs_screw_dim.scad>
include <../library/din41612/din41612_female_dim.scad>
include <../library/din41612/din41612_male_dim.scad>
include <../pcb/pcb_dim.scad>
// motherboard pcb dimensions
motherboard_l=pcb_l;   // pcb width
motherboard_h=1.6;     // pcb thickness
step=25.4;             // distance between modules

function motherboard_w(n)=din41612_female_w+step*(n-1);

screw_motherboard_d=M2_5;
screw_motherboard_l=16;
motherboard_pass=0.5;// gap to fit screws 

motherboard_z_offset=-din41612_male_w1-din41612_female_h1-motherboard_h;
// file: ../bracket/bracket_dim.scad
// bracket

include <../pcb/pcb_dim.scad>
include <../motherboard/motherboard_dim.scad>
include <../library/linurs/linurs_screw_dim.scad>

bracket_screw=M2_5;   // hole for the screw

bracket_gap=0.5;      // gap between bracket to make sure it fits in the box
bracket_screw_gap=0.5;// gap to fit the screw

bracket_l=pcb_w+15;   // height of bracket
bracket_l1=19;        // hole l
bracket_l2=3*screw_d[bracket_screw];
bracket_ld=pcb_wd;    // hole distance

bracket_h=10;         // depth of the U shape at the side of the screw
bracket_h1=4;         // depth of the U shape at the side where no screw is 
bracket_h2=2-bracket_gap/2;   // thickness of bracket
bracket_h3=5;         // hole h

bracket_w1=4;         // height of the mounting hole cube
bracket_tn=2;         // thickness of bracket
bracket_t=bracket_tn-bracket_gap/2;  // thickness of bracket - gap

bracket_offset_z=-10;  // bracket offset in elecbox z axis

function bracket_w(n)=step*n-bracket_gap;
function bracket_w2(n)=step*n-2*bracket_tn;
// file: ../pcb/pcb_dim.scad
// The pcb is the master object of the project
// therefore no other include files from other objects
// are necessary

// pcb constants
pcb_l =100;  // lenght of the pcb
pcb_ld = 94; // hole distance 
pcb_w=80;    // height of the pcb
pcb_wd = 67; // hole distance
pcb_wd1 = 9; // hole to edge distance 
pcb_d=3;     // diameter of holes
pcb_h=1.6;   // thickness
// main file
// BatDoc module
// =============

BatDoc="assembly"; // [assembly,front,back,print_front,print_back]

include <../pcb/pcb_dim.scad>
include <../bracket/bracket_dim.scad>
include <../motherboard/motherboard_dim.scad>
include <../library/linurs/linurs_screw_dim.scad>

use <../library/linurs/linurs_screw.scad>
use <../bracket/bracket.scad>
use <../pcb/pcb.scad>

module BatDoc_back(){
    translate([0,0,bracket_offset_z])back_bracket(n=2);
}

module BatDoc_front(){
    d1=7;
    h1=10;
    z1=20;
    y1=2;
    
    d2=7;
    h3=10;
    z2=65;
    
    difference(){
        translate([0,0,bracket_offset_z])front_bracket(n=2);
    
        for(i=[-1,1]){
          translate([
            0,
            i*h1+2*h1+pcb_h,
            z1])rotate([0,90,0])
          cylinder(h=bracket_h,d=d1,center=true, $fn=16); 
          
          translate([
            0,
            i*h1+2*h1+pcb_h,
            z1])
          cube([bracket_h,y1,d1+2*y1],center=true); 
        }
 
        translate([
          0,
          h3+pcb_h,
          z2])rotate([0,90,0])
        cylinder(h=bracket_h,d=d2,center=true, $fn=16);      
    }
}

module BatDoc_assembly(){
    pcb_assembly();
    BatDoc_front();
    translate([pcb_l,0,0])BatDoc_back();
}

if(BatDoc=="assembly"){
  BatDoc_assembly();
}

if(BatDoc=="front"){
   BatDoc_front();
}

if(BatDoc=="back"){
   BatDoc_back();
}

if(BatDoc=="print_front"){
  rotate([0,-90,0])
    BatDoc_front();
}

if(BatDoc=="print_back"){
  rotate([0,90,0])BatDoc_back();
}
